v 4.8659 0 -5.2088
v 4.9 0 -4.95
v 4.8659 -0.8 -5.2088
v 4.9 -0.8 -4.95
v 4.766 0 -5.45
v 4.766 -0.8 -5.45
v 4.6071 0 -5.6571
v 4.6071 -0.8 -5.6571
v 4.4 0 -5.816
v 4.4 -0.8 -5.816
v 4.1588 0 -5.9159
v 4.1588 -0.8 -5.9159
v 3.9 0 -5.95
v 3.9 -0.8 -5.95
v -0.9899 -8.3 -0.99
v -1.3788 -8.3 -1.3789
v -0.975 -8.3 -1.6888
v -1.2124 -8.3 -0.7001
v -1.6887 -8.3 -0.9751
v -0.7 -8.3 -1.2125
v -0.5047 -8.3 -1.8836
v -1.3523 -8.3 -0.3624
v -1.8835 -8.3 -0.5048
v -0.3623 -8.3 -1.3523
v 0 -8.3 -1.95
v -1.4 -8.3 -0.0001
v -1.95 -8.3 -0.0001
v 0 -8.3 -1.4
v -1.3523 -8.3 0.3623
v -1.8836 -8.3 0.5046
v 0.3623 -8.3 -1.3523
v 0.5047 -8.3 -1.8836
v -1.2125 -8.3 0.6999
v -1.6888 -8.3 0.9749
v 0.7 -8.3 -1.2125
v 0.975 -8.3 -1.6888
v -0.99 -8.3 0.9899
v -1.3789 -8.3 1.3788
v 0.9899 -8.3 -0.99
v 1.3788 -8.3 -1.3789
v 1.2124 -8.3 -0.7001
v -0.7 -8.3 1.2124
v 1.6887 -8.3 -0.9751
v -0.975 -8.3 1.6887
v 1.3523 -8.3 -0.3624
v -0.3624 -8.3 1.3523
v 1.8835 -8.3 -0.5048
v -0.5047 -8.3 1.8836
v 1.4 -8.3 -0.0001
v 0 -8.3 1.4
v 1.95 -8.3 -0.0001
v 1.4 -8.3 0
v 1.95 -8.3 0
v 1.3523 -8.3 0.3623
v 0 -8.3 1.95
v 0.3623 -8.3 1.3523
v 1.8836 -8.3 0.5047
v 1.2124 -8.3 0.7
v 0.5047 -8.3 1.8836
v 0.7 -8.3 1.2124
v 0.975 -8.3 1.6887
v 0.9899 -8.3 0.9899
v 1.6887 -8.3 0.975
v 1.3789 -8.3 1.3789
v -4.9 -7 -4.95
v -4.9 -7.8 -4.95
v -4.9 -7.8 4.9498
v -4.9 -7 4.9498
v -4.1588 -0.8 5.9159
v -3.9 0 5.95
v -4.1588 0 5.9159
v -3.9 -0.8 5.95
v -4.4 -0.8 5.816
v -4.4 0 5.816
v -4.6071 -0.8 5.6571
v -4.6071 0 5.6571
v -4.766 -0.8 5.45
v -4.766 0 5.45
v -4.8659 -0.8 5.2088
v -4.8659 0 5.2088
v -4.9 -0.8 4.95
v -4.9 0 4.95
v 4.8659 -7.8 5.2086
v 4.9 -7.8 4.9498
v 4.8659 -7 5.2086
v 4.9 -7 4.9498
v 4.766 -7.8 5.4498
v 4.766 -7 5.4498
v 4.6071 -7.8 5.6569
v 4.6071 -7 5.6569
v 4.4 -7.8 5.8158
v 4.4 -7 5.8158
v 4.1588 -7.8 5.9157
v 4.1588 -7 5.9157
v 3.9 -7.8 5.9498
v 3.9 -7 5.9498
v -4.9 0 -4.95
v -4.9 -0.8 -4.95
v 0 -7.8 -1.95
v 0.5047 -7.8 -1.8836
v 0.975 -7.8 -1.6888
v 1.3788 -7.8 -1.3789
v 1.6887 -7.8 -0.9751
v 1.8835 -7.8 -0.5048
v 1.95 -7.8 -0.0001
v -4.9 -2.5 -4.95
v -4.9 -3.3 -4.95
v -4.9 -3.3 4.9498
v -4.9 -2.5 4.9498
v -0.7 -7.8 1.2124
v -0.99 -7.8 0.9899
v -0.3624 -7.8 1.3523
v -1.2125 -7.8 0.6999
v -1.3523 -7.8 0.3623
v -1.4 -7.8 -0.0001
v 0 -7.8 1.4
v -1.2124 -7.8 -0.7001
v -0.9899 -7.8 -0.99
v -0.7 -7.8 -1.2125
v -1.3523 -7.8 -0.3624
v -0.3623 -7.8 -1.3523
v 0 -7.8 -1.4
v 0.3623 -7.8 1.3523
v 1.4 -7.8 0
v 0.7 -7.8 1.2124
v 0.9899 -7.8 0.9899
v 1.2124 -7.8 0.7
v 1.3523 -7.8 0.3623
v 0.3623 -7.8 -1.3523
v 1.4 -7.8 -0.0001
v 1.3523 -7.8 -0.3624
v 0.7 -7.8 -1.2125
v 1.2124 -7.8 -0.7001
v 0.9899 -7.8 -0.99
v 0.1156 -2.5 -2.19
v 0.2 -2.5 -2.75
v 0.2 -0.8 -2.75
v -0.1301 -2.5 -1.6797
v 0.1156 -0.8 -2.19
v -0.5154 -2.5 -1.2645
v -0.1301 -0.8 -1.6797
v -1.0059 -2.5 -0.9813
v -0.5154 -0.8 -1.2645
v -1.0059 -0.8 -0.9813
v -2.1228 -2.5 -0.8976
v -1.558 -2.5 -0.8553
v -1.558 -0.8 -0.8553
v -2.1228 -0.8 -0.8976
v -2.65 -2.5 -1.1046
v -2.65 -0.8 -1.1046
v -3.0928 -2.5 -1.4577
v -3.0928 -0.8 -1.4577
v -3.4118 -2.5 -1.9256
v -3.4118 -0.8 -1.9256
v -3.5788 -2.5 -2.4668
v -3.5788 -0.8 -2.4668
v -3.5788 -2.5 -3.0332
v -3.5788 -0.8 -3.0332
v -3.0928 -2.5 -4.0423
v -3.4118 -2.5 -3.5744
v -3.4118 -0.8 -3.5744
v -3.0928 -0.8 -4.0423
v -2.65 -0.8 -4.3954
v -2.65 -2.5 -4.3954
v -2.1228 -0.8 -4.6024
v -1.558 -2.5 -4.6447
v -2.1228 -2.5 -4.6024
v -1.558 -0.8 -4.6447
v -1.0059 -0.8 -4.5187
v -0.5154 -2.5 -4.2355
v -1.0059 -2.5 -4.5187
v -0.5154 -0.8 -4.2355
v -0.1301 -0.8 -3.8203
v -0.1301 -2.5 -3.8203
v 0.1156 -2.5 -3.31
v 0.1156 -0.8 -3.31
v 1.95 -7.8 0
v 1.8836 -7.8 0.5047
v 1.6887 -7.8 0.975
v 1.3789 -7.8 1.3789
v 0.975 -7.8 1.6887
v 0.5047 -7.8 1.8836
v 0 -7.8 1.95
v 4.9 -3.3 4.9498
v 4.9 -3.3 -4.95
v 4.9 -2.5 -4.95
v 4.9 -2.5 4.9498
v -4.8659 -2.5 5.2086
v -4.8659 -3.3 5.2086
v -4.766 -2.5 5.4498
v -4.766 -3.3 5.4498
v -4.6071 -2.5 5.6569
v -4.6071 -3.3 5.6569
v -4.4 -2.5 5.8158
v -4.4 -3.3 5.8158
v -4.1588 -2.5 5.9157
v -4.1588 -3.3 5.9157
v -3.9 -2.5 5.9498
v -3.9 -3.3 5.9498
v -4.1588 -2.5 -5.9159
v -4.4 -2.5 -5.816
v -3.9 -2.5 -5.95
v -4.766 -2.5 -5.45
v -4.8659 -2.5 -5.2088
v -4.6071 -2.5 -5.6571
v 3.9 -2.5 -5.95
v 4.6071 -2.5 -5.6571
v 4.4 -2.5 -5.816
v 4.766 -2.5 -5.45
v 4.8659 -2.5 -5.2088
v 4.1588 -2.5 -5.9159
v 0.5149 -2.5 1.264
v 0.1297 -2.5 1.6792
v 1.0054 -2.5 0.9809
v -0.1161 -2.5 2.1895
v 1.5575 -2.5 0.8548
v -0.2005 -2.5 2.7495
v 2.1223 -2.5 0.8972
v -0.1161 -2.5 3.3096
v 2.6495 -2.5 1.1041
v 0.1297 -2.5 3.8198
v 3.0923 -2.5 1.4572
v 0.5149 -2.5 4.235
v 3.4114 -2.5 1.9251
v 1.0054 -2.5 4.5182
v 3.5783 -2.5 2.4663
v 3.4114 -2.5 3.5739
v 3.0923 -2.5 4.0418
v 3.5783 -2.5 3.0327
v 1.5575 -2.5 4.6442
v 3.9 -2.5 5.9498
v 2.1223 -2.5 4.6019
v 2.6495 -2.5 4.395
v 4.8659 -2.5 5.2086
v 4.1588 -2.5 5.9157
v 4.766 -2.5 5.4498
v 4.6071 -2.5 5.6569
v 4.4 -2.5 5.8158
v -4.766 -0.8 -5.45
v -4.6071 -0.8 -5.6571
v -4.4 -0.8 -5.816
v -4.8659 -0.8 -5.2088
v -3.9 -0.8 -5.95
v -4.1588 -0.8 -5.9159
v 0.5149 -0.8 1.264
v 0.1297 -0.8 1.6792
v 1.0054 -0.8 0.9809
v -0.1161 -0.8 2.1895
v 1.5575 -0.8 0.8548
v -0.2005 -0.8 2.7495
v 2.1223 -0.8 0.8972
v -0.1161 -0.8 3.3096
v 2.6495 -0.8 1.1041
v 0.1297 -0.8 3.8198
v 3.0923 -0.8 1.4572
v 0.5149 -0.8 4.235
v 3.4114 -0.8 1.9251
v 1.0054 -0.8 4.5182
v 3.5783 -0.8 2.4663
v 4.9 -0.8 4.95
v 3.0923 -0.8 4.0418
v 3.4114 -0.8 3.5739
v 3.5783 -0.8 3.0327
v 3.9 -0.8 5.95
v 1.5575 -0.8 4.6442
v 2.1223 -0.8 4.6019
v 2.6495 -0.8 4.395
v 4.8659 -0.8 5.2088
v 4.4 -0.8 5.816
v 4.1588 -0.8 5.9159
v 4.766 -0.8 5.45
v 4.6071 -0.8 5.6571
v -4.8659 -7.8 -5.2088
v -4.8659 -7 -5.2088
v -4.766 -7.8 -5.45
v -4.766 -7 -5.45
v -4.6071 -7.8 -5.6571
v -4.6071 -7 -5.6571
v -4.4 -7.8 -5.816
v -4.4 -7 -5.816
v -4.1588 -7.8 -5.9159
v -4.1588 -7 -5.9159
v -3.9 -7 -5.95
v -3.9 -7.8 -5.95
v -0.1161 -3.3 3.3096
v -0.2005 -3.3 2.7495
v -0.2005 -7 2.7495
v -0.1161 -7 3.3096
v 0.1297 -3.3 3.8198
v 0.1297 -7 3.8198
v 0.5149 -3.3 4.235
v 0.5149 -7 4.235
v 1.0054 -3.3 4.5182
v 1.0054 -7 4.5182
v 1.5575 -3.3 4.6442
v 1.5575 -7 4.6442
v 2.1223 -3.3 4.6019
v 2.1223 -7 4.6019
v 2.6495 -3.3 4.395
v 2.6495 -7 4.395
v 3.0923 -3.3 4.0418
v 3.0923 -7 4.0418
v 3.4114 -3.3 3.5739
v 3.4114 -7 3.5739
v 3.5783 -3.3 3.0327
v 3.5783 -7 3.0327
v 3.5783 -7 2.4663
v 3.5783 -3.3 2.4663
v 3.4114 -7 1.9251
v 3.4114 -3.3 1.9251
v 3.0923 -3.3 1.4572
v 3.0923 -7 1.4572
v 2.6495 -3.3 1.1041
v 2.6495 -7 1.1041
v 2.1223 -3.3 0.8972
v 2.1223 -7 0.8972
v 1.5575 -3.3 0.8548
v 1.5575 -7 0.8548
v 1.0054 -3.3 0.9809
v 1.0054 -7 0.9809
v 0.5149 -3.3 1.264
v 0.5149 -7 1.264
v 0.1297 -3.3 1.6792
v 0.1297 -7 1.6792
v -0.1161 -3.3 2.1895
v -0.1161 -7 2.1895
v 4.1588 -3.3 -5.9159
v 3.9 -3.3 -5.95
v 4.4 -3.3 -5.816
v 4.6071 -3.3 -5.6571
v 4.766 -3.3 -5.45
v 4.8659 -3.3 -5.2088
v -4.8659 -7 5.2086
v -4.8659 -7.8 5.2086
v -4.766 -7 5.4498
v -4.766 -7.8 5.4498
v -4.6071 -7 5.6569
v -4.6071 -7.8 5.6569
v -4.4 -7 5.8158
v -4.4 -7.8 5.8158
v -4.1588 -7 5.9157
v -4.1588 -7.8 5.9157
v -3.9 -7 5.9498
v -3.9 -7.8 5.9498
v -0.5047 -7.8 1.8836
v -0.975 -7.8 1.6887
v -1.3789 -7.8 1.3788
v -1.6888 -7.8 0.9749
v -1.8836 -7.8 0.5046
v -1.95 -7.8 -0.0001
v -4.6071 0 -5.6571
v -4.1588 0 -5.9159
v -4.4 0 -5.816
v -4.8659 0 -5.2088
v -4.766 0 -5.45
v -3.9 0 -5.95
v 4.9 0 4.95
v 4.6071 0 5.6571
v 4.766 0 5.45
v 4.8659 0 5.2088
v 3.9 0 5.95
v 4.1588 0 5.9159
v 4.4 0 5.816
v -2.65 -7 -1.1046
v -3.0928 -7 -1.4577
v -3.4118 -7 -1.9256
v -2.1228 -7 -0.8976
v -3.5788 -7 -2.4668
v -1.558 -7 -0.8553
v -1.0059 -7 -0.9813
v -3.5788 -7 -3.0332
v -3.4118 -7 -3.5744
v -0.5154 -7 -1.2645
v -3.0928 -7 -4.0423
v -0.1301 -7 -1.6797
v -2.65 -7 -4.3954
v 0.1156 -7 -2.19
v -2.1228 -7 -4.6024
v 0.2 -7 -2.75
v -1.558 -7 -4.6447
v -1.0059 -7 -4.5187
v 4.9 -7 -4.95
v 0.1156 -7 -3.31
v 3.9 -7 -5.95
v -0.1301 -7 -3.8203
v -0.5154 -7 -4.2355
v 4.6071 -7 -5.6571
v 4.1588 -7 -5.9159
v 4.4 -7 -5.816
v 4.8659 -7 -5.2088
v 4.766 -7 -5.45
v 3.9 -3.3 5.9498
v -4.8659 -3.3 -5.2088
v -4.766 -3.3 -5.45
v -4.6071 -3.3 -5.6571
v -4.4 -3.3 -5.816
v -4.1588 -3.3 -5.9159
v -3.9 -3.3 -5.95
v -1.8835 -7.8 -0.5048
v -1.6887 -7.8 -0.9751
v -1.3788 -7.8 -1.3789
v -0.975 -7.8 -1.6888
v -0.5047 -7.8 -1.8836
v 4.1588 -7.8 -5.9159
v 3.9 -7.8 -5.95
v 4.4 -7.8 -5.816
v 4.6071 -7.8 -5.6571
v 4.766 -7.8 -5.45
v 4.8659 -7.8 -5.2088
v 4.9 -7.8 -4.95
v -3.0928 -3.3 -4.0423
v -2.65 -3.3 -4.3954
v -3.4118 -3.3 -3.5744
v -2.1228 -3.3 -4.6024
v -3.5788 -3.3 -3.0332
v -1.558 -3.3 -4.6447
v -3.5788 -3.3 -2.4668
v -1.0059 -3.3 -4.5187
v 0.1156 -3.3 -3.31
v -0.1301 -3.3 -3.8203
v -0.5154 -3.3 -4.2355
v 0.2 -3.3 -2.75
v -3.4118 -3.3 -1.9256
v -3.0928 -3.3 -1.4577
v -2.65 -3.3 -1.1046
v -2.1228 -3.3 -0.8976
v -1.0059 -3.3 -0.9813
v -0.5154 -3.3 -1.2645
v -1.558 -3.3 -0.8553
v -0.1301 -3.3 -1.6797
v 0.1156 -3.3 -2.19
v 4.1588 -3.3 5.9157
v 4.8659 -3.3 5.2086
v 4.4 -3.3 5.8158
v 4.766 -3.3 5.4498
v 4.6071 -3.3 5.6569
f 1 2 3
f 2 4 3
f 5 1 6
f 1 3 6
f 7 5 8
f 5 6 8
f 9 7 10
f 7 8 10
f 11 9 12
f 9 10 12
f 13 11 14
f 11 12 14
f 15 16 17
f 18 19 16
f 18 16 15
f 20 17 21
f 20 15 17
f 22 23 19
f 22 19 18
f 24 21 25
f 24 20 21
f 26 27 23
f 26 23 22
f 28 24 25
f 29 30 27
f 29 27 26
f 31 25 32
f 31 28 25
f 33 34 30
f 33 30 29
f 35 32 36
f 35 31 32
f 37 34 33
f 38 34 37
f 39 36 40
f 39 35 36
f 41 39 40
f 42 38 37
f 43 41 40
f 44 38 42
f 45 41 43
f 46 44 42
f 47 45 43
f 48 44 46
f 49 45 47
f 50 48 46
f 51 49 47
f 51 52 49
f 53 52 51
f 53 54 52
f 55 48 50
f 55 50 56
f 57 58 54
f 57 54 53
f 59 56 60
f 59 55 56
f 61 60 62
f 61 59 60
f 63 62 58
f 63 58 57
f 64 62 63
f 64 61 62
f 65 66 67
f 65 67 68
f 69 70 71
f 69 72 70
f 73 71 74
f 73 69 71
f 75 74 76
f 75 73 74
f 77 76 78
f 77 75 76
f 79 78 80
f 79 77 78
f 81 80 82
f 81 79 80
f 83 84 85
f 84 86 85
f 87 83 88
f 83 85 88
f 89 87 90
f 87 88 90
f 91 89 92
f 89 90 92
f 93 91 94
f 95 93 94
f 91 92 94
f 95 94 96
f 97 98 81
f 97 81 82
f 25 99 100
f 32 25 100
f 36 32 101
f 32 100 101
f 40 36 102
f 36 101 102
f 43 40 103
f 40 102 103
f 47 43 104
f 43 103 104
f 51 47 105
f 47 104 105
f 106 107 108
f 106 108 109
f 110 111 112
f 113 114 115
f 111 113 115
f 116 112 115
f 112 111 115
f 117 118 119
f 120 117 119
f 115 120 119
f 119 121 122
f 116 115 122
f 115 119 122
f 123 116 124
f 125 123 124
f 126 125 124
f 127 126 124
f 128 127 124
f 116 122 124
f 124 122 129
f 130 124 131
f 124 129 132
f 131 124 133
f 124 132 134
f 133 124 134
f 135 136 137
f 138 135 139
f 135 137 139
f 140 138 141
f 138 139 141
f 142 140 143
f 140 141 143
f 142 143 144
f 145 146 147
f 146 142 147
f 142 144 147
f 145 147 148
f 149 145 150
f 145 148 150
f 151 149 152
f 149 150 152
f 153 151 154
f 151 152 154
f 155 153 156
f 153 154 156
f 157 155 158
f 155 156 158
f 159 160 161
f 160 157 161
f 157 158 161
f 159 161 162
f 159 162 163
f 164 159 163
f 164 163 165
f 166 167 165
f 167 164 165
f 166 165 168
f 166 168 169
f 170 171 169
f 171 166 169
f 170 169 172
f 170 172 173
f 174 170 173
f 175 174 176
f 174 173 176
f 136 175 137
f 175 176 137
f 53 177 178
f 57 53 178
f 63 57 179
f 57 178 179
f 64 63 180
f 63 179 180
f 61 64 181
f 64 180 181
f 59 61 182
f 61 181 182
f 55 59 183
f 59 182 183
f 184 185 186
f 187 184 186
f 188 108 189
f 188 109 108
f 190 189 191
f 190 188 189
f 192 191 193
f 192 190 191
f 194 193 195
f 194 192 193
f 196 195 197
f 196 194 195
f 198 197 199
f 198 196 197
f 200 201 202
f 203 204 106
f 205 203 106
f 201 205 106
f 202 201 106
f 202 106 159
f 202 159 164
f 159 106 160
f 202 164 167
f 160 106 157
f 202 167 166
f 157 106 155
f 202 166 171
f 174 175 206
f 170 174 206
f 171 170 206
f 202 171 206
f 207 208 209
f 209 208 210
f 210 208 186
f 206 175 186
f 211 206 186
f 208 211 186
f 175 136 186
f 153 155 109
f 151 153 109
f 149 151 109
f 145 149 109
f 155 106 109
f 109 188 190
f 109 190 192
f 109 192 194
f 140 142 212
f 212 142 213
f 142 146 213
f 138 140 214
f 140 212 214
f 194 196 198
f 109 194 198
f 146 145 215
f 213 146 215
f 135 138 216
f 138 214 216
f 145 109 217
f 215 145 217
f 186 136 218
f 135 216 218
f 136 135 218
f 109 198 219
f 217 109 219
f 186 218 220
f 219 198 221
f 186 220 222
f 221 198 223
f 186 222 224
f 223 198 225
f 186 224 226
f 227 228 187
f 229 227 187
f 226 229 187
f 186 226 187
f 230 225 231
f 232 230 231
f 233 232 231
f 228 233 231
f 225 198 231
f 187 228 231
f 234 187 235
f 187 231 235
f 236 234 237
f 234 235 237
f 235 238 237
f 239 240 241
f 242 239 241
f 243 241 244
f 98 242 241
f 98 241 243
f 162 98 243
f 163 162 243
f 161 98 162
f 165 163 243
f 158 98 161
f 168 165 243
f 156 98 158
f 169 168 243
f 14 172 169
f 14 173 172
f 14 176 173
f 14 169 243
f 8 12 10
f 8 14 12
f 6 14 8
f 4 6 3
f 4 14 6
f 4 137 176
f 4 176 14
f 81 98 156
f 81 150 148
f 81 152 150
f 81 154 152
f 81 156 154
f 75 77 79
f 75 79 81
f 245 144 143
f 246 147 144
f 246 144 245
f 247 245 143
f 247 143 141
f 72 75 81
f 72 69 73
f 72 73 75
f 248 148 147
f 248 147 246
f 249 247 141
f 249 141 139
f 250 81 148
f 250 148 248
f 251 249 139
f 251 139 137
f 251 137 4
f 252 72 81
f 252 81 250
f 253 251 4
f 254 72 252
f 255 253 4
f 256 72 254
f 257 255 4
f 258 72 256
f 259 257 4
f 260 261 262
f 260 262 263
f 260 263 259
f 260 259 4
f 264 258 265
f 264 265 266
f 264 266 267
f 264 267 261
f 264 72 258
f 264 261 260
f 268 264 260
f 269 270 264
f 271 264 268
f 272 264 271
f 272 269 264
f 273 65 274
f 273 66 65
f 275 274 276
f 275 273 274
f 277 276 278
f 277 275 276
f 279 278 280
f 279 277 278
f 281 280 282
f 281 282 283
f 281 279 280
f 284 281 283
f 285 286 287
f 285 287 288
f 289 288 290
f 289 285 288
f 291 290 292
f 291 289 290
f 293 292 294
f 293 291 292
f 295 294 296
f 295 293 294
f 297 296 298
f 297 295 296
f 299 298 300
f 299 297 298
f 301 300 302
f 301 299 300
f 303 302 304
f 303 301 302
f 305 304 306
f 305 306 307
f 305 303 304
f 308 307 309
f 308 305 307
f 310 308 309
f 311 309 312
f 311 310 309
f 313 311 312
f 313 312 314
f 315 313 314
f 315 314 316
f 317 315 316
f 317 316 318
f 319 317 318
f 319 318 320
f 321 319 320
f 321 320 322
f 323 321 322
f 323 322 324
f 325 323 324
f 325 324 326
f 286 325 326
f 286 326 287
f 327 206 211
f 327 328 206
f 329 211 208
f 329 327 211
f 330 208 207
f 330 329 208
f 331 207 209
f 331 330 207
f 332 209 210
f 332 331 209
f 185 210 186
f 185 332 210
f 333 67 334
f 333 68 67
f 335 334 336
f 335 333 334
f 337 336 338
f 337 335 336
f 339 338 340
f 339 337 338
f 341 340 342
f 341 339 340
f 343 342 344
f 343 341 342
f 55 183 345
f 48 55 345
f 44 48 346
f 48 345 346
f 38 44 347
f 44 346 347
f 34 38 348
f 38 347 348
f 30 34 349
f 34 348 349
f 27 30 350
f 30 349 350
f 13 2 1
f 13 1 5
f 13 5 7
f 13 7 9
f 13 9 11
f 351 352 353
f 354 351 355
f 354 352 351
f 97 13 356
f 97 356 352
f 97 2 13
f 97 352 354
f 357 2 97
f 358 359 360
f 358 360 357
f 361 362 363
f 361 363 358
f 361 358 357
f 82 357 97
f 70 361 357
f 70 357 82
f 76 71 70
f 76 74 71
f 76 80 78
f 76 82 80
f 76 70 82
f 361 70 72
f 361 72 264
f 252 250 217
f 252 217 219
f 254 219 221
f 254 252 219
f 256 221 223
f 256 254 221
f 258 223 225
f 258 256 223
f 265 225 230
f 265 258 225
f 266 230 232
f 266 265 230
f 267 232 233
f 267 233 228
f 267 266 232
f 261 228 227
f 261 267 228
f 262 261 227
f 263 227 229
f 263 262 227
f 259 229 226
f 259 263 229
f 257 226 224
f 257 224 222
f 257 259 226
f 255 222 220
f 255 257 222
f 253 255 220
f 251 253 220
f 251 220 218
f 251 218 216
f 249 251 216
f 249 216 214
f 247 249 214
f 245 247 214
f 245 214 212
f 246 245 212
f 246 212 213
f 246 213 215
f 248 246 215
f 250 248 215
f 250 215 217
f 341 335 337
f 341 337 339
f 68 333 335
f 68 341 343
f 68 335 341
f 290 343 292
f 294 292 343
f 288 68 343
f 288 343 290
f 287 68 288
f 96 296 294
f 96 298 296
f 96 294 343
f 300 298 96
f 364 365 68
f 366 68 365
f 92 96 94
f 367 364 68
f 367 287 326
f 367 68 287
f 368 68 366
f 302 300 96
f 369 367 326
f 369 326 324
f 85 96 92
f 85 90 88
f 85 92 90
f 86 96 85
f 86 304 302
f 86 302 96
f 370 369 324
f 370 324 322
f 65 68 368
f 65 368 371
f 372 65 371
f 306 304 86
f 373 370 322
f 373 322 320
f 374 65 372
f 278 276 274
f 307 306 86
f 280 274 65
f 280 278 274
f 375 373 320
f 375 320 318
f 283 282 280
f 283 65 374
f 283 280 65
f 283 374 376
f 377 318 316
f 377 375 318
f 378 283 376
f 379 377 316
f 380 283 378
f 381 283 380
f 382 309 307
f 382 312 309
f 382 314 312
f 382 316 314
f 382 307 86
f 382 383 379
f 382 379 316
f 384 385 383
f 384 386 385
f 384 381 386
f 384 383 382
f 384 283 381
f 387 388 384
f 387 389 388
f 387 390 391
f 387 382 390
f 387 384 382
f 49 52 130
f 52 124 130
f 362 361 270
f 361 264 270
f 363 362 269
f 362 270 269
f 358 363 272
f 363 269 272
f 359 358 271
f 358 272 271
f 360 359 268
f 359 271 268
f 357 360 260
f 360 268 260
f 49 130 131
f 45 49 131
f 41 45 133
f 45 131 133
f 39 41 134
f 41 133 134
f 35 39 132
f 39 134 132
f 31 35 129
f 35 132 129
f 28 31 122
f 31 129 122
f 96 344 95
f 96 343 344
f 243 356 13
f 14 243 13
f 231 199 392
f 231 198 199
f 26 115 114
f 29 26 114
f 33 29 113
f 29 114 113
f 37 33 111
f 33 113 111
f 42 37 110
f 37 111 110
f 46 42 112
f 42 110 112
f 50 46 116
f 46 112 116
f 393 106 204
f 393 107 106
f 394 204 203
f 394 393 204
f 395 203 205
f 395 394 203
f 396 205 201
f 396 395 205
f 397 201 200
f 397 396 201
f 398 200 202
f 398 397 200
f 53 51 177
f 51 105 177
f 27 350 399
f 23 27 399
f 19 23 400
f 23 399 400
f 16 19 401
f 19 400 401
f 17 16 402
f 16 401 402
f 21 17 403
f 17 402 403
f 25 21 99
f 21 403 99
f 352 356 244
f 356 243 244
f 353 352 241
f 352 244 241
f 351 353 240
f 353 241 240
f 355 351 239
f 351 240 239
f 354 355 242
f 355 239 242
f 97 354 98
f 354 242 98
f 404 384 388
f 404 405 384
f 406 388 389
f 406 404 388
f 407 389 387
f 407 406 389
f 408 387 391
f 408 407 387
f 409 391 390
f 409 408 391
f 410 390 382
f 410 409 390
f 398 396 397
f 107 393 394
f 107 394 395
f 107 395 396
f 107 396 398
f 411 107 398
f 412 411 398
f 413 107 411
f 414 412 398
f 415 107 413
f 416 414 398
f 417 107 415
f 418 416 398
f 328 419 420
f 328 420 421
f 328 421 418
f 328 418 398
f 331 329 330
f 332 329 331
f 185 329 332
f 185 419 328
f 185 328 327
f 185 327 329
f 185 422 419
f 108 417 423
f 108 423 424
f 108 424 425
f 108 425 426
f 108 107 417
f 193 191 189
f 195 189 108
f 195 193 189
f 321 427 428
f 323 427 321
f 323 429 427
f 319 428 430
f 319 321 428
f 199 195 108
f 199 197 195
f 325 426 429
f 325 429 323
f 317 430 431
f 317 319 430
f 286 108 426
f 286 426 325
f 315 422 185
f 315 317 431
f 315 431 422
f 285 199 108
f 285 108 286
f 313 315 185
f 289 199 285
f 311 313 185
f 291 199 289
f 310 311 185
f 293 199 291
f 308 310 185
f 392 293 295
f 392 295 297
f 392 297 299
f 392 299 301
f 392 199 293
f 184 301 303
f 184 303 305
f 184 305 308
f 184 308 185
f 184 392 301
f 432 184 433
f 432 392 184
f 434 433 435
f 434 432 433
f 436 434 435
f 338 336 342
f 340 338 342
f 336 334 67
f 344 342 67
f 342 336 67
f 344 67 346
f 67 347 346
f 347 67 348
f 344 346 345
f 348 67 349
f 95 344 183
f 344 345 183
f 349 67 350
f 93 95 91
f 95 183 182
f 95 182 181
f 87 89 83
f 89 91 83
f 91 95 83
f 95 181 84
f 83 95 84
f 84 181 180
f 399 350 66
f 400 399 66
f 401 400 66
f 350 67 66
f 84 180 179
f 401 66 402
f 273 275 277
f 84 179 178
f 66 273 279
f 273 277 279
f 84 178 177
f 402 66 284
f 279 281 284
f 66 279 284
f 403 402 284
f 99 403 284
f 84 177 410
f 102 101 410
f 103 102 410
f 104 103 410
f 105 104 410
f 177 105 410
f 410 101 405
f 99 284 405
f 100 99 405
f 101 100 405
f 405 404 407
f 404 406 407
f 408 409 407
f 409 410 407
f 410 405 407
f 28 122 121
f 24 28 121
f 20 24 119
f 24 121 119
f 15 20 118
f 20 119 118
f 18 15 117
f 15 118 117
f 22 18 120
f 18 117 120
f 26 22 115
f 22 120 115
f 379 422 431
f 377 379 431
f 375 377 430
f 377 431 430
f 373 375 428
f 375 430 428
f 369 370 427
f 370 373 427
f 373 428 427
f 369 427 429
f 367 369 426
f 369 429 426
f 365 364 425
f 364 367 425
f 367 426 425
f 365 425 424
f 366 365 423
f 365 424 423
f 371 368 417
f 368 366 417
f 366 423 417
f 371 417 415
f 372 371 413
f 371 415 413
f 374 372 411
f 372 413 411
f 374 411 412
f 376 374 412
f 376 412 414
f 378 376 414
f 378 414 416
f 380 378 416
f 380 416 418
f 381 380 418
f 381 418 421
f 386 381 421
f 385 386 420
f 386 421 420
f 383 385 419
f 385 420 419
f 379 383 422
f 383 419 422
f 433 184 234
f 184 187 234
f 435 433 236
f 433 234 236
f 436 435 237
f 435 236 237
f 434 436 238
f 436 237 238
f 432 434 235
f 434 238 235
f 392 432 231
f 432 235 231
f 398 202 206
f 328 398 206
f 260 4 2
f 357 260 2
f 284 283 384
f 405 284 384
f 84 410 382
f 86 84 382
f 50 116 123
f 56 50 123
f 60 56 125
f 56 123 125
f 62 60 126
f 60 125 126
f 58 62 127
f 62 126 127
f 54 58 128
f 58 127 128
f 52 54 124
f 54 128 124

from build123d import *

# Parameters (mm, degrees)
F0_W      = 9.8
F0_H      = 11.9
F1_DEPTH  = 0.8
F2_R      = 1.9
F4_DEPTH  = 6.9
F3_R      = 1.9
F5_DEPTH  = 7.7
F6_W      = 9.8
F6_H      = 0.5256494999
F7_DEPTH  = 25.4
F8_W      = 9.8
F8_H      = 0.8
F9_DEPTH  = 11.37412
F10_DEPTH = 25.4
F11_R     = 1
F13_DEPTH = 0.5


with BuildPart() as f1:
    # F0 (on Front) → F1 (new body)
    with BuildSketch(Plane.XZ):
        Rectangle(F0_W, F0_H)
    extrude(amount=F1_DEPTH)

    # F2 (on face) → F4 (join)
    with BuildSketch(Plane.XZ.offset(0.8)):
        with Locations((-1.7, -2.75)):
            Circle(F2_R)
    extrude(amount=F4_DEPTH)

    # F3 (on face) → F5 (join)
    with BuildSketch(Plane(origin=(0, 0, 0), x_dir=(-1, 0, 0), z_dir=(0, 1, 0))):
        with Locations((-1.69952, 2.74952)):
            Circle(F3_R)
    extrude(amount=-F5_DEPTH)

    # F6 (on face) → F7 (join)
    with BuildSketch(Plane.XZ.offset(0.8)):
        with Locations((0, -5.6871752501)):
            Rectangle(F6_W, F6_H)
    extrude(amount=F7_DEPTH)

    # F8 (on face) → F9 (join)
    with BuildSketch(Plane.XY.offset(-5.4243505001)):
        with Locations((0, -2.9)):
            Rectangle(F8_W, F8_H)
        with Locations((0, -7.4)):
            Rectangle(F8_W, F8_H)
    extrude(amount=F9_DEPTH)

    # F10 (cut): faces of the model
    f10_faces = [f1.faces().sort_by_distance(p)[0] for p in [
        (0, -17, -5.4243505001),
        (0, -5.15, -5.4243505001),
        (0, -1.65, -5.4243505001),
    ]]
    extrude(f10_faces, amount=-F10_DEPTH, mode=Mode.SUBTRACT)

    # F11
    f11_edges = [f1.edges().sort_by_distance(p)[0] for p in [
        (-4.9, -7.4, 5.949769),
        (-4.9, -2.9, 5.949769),
        (-4.9, -0.4, 5.95),
        (-4.9, -0.4, -5.95),
        (-4.9, -2.9, -5.95),
        (-4.9, -7.4, -5.95),
        (4.9, -7.4, 5.949769),
        (4.9, -2.9, 5.949769),
        (4.9, -0.4, 5.95),
        (4.9, -0.4, -5.95),
        (4.9, -7.4, -5.95),
        (4.9, -2.9, -5.95),
    ]]
    fillet(f11_edges, radius=F11_R)

    # F12 (on face) → F13 (join)
    with BuildSketch(Plane.XZ.offset(7.8)):
        with BuildLine():
            ThreePointArc((0, 1.95), (-1.3788989698, 1.3788174757), (-1.9499999966, -0.0001152501))
            Line((-1.9499999966, -0.0001152501), (-1.3999999953, -0.0001152501))
            ThreePointArc((-1.3999999953, -0.0001152501), (-0.9899902399, 0.9899087458), (0, 1.4))
            Line((0, 1.4), (0, 1.95))
        make_face()
        with BuildLine():
            Line((-1.3999999953, -0.0001152501), (-1.9499999966, -0.0001152501))
            ThreePointArc((-1.9499999966, -0.0001152501), (-1.3788174757, -1.3788989698), (0, -1.95))
            Line((0, -1.95), (0, -1.4))
            ThreePointArc((0, -1.4), (-0.9899087458, -0.9899902399), (-1.3999999953, -0.0001152501))
        make_face()
        with BuildLine():
            ThreePointArc((1.95, 0), (1.3788582233, 1.3788582233), (0, 1.95))
            Line((0, 1.95), (0, 1.4))
            ThreePointArc((0, 1.4), (0.9899494937, 0.9899494937), (1.4, 0))
            ThreePointArc((1.4, 0), (1.3999999988, -5.7625e-05), (1.3999999953, -0.0001152501))
            Line((1.3999999953, -0.0001152501), (1.9499999966, -0.0001152501))
            ThreePointArc((1.9499999966, -0.0001152501), (1.9499999991, -5.7625e-05), (1.95, 0))
        make_face()
        with BuildLine():
            Line((0, -1.4), (0, -1.95))
            ThreePointArc((0, -1.95), (1.3788174757, -1.3788989698), (1.9499999966, -0.0001152501))
            Line((1.9499999966, -0.0001152501), (1.3999999953, -0.0001152501))
            ThreePointArc((1.3999999953, -0.0001152501), (0.9899087458, -0.9899902399), (0, -1.4))
        make_face()
    extrude(amount=F13_DEPTH)


solid = f1.part
